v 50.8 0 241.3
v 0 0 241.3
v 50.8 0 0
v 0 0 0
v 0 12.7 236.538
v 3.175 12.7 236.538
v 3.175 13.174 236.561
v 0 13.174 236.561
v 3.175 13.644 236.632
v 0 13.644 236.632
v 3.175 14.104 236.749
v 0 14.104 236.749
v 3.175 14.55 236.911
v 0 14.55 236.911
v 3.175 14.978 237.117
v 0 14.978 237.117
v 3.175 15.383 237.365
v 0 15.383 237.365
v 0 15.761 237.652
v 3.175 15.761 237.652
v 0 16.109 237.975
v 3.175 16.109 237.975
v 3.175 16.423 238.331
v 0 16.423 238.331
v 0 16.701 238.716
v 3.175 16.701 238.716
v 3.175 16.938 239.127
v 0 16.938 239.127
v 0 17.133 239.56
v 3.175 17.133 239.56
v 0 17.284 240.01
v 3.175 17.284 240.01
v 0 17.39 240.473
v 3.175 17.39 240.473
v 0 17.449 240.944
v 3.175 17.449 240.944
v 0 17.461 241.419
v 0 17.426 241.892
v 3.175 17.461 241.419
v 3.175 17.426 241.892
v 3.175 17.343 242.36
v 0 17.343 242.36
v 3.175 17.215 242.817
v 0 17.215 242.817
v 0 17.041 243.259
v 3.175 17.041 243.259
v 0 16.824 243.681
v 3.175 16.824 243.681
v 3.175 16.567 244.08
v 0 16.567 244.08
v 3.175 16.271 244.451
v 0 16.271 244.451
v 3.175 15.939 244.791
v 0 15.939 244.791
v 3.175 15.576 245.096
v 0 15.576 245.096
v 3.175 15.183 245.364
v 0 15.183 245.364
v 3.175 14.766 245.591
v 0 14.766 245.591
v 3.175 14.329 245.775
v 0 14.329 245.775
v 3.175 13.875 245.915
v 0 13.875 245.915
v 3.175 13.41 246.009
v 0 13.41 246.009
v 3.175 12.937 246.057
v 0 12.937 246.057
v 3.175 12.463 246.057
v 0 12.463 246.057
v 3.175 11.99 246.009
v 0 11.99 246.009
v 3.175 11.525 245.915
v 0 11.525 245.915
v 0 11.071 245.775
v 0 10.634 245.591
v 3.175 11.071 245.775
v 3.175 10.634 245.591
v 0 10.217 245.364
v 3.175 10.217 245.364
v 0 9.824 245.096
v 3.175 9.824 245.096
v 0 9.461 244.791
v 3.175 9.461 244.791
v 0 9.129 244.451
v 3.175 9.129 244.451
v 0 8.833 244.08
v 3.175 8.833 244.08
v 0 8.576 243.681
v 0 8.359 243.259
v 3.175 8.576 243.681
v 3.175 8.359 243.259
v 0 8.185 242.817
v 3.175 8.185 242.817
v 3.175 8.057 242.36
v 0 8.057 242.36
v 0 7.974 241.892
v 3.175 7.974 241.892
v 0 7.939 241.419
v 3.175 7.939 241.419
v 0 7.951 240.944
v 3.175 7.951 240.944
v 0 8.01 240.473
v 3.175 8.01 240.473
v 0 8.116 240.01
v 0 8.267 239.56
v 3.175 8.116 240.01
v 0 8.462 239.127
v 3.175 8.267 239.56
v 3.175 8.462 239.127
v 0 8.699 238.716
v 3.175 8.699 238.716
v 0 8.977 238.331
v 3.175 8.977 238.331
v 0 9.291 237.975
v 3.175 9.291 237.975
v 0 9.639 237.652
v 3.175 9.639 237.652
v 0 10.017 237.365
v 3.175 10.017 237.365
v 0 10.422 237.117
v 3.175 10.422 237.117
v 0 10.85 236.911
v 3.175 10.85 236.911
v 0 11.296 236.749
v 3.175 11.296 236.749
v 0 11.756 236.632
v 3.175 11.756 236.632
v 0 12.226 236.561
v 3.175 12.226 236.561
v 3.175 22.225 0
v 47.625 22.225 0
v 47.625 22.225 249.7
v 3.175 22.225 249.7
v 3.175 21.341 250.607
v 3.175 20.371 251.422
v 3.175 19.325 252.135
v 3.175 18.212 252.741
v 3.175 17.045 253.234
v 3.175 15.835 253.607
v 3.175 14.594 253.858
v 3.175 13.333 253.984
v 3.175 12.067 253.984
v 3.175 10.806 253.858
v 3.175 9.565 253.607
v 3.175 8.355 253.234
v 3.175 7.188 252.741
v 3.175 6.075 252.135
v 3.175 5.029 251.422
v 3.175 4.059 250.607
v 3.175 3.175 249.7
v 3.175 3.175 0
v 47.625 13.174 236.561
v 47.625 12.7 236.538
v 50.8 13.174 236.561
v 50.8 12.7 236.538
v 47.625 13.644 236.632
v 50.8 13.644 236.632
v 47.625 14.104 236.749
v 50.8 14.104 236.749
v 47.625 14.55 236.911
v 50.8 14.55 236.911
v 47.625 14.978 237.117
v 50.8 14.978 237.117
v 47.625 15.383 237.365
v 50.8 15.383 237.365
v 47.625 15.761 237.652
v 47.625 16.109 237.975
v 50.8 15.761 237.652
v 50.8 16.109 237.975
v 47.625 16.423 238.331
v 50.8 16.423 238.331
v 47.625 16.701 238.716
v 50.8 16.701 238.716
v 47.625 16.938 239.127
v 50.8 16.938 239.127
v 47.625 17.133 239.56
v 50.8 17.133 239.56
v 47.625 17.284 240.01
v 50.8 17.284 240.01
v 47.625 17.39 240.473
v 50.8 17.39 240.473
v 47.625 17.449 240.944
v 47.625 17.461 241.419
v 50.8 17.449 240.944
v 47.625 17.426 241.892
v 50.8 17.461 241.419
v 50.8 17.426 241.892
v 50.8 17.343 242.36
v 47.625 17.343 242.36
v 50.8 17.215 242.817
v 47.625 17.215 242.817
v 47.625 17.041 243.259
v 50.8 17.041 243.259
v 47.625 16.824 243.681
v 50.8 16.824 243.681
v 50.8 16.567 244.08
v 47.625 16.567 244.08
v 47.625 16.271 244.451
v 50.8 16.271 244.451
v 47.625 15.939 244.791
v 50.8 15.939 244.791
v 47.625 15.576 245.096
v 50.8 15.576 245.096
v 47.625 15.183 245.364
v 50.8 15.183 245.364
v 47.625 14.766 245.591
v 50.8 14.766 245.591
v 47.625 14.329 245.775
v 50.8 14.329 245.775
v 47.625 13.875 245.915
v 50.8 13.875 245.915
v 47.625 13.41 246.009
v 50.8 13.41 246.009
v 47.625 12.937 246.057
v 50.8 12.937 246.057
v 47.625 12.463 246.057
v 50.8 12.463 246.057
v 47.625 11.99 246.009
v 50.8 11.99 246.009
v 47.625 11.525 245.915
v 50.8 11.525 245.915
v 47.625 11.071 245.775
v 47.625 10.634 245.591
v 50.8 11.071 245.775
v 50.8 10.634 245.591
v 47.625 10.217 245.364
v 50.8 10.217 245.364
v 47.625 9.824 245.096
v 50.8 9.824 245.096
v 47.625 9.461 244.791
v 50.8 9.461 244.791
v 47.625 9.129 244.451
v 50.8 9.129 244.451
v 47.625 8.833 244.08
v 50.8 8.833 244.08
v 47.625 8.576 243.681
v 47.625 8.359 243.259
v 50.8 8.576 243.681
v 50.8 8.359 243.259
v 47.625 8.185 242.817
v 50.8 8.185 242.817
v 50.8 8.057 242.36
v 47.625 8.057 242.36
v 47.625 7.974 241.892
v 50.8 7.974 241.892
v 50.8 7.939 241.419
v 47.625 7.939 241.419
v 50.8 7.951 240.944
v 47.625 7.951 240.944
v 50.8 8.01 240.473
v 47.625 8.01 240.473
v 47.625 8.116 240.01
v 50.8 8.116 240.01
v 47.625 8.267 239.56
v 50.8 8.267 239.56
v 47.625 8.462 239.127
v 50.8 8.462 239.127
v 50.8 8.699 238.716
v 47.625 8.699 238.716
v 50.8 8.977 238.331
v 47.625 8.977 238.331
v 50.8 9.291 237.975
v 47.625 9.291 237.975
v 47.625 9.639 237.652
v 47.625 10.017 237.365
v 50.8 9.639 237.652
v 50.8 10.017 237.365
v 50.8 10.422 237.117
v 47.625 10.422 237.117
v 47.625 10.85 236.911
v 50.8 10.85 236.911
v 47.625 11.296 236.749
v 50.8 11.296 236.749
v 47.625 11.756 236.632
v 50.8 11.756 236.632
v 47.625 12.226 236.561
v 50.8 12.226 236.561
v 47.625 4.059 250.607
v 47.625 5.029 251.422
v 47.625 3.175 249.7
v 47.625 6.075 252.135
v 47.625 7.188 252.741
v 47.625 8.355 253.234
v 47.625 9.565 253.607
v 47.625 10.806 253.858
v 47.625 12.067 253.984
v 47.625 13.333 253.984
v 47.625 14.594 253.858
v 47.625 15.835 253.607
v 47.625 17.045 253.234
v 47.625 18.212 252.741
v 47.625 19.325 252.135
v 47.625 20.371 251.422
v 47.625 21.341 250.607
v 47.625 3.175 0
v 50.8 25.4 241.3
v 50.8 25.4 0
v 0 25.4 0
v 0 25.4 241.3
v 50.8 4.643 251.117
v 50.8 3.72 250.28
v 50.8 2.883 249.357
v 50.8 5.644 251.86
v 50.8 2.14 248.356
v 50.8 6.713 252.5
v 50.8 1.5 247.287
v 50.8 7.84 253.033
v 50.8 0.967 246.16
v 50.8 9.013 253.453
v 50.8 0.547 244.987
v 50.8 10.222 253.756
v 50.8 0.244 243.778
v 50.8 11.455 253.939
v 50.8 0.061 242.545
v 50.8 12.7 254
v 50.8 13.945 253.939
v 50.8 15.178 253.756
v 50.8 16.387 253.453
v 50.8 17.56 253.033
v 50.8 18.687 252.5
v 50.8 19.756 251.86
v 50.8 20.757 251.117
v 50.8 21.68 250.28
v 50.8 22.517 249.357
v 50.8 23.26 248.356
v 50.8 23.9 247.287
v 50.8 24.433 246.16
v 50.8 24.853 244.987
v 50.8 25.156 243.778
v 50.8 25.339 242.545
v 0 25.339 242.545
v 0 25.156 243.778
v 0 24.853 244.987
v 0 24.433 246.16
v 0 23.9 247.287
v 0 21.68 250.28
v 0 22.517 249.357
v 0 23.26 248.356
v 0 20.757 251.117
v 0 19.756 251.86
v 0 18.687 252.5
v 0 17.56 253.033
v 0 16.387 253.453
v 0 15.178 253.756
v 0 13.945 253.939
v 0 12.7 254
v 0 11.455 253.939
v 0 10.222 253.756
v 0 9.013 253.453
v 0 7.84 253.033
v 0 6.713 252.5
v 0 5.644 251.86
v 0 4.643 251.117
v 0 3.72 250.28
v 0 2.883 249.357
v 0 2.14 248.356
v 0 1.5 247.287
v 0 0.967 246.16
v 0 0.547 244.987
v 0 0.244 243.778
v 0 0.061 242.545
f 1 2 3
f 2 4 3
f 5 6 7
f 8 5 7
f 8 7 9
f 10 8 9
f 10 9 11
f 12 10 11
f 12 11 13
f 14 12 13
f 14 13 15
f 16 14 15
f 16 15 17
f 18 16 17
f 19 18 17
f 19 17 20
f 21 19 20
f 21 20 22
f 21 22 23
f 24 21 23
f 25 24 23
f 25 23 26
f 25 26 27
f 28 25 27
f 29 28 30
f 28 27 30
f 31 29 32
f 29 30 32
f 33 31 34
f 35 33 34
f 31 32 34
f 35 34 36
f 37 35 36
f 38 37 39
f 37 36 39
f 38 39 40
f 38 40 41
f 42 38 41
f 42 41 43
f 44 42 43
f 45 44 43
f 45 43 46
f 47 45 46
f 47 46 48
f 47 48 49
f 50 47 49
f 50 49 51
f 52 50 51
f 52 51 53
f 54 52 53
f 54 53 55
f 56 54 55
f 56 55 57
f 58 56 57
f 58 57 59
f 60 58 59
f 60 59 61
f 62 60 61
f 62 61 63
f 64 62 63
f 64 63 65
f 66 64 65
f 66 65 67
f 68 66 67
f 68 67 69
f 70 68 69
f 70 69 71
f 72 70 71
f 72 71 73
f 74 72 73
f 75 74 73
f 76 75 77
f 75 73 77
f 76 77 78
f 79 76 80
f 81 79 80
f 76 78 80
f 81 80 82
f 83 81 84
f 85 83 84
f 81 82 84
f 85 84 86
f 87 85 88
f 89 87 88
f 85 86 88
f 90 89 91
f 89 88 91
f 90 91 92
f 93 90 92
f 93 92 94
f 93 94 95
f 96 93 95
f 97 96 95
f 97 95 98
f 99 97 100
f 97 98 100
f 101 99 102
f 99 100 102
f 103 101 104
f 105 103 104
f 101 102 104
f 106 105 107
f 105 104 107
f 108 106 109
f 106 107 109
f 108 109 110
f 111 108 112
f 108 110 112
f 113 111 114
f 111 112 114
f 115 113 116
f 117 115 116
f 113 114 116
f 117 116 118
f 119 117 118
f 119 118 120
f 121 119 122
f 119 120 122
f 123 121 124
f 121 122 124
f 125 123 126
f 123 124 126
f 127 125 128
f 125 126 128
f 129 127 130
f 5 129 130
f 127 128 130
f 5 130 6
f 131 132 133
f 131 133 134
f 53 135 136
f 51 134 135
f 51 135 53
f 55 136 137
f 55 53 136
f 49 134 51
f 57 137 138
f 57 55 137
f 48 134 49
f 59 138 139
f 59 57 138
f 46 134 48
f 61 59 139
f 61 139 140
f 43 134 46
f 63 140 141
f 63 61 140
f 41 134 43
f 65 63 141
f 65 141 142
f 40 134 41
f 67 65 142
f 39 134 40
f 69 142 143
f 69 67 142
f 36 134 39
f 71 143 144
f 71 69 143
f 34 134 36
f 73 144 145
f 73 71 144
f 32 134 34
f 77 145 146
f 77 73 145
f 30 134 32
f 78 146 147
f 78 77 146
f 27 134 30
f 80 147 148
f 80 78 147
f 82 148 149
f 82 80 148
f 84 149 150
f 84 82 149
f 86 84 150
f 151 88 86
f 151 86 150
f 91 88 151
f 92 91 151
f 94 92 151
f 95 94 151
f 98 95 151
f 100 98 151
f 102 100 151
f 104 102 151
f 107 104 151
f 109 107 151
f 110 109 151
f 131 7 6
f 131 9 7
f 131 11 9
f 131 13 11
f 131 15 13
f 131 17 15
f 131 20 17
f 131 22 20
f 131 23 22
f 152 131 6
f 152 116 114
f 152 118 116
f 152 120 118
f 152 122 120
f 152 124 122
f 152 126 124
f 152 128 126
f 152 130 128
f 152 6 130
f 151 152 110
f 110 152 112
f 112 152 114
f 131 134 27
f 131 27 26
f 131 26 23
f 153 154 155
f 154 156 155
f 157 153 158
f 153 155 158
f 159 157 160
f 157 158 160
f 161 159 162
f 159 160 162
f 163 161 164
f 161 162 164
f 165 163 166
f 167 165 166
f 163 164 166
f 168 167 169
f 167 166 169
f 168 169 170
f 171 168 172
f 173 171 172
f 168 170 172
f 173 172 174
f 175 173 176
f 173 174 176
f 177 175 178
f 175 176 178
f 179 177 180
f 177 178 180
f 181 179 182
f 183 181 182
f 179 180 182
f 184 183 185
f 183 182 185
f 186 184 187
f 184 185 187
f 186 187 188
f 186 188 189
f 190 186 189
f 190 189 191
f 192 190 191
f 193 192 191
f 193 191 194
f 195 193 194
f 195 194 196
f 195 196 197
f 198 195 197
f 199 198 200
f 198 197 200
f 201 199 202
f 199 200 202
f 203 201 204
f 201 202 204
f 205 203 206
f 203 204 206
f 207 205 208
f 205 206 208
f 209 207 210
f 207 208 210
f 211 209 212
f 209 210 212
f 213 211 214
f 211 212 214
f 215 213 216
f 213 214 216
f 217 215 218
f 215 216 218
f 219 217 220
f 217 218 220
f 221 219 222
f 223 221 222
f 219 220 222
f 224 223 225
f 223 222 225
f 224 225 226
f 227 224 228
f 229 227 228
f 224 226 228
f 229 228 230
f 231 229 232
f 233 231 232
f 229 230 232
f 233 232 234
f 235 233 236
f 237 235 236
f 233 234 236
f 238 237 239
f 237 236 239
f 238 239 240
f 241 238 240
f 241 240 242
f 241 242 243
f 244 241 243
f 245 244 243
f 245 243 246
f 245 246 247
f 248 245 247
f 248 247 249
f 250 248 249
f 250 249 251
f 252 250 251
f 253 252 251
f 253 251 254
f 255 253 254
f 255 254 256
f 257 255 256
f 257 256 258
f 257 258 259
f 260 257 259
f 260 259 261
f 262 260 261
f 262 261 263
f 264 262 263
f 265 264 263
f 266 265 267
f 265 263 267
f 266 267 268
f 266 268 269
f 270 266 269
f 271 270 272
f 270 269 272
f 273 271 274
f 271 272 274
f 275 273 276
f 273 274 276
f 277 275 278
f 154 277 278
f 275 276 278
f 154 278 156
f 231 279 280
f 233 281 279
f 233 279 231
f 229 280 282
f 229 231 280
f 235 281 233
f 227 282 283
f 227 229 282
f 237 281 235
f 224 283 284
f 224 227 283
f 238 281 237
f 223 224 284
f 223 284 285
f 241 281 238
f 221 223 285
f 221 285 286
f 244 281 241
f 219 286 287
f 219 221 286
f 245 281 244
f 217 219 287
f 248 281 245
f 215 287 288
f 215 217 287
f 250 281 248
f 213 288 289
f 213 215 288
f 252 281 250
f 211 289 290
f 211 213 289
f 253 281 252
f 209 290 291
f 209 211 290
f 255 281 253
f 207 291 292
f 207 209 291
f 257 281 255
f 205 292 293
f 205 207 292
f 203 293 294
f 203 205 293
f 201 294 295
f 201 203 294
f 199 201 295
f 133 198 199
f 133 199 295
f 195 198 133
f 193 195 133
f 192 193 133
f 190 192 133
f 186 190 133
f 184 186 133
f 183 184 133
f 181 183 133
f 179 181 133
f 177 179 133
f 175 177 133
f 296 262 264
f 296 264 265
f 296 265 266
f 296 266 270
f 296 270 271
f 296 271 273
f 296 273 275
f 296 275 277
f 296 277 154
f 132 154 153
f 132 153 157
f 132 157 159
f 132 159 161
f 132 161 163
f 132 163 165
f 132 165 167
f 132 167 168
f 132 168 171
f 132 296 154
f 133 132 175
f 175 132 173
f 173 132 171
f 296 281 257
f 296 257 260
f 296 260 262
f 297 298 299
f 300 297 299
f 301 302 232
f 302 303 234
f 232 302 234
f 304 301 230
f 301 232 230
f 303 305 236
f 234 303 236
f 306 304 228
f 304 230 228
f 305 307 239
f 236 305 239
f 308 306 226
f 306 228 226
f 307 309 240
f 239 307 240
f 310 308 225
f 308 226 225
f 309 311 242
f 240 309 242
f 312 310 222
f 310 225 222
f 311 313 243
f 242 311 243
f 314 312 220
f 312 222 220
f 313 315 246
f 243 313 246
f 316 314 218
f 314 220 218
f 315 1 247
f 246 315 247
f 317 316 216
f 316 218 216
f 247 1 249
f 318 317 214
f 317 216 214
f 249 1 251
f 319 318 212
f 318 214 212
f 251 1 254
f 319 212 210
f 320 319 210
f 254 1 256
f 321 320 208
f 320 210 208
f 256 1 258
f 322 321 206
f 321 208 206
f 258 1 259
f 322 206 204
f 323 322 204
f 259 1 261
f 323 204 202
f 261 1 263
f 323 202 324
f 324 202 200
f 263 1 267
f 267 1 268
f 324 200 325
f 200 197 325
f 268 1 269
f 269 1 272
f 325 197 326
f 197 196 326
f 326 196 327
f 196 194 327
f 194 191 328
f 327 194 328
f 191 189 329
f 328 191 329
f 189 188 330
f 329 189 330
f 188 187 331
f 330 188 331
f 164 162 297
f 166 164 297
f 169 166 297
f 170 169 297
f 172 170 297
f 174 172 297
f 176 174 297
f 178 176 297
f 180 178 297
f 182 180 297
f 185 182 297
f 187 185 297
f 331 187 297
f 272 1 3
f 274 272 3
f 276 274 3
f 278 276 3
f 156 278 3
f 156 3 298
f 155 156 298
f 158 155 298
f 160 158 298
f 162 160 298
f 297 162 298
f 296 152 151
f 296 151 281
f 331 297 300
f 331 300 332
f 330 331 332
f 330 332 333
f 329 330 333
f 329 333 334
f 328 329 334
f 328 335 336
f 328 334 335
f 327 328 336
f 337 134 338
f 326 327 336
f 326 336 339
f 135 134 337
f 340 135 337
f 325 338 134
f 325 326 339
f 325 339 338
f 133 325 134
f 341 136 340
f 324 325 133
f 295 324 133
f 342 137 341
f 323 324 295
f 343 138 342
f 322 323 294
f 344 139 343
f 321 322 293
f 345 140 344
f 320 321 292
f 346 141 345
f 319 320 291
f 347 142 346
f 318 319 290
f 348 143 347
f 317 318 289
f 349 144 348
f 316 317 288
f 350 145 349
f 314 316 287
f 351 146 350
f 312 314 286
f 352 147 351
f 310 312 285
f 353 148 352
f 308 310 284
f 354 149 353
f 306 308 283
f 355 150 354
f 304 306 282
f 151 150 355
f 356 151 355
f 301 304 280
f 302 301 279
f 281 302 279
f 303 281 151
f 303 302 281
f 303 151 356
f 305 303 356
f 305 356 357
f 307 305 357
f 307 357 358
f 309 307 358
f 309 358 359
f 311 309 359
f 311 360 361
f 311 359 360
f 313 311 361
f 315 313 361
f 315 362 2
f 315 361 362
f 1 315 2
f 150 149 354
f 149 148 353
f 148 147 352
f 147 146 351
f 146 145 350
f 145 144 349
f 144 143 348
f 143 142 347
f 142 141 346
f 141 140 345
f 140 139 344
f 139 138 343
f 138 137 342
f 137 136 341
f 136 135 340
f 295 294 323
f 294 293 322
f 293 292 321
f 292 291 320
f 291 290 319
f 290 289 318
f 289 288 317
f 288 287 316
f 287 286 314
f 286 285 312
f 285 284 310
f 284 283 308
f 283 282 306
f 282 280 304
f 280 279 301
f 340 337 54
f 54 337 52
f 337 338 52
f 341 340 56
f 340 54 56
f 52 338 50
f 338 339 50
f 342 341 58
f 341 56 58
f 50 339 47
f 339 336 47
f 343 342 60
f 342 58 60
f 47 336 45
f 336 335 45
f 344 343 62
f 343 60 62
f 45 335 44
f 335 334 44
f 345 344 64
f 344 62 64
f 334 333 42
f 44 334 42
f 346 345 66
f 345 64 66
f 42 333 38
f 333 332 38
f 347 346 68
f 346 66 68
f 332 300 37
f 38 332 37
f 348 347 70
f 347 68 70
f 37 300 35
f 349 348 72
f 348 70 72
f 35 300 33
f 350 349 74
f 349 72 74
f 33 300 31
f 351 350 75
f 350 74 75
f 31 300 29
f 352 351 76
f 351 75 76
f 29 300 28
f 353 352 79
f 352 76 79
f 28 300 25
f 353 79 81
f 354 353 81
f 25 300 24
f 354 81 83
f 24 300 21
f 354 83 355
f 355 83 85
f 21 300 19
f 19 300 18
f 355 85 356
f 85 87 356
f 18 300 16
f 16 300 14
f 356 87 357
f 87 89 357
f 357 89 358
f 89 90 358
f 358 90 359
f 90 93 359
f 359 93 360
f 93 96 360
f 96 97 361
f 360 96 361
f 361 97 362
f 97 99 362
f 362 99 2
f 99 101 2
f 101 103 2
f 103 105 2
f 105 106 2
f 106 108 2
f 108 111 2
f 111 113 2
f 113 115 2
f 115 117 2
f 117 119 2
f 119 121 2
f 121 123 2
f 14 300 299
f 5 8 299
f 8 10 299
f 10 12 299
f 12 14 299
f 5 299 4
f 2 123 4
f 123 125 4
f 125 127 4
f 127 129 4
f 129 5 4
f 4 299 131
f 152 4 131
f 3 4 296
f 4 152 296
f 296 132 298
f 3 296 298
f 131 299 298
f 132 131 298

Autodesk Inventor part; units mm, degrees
ref_plane "YZ Plane" through (0, 0, 0) normal (1, 0, 0) x (0, 1, 0)
ref_plane "XZ Plane" through (0, 0, 0) normal (0, 1, 0) x (-1, 0, 0)
ref_plane "XY Plane" through (0, 0, 0) normal (0, 0, 1) x (1, 0, 0)
sketch "Sketch1" plane through (0, 0, 0) normal (0, 0, 1) x (1, 0, 0)
  line L0 (0, 0) -> (50.8, 0)
  line L1 (50.8, 0) -> (50.8, 25.4)
  line L2 (50.8, 25.4) -> (0, 25.4)
  line L3 (0, 25.4) -> (0, 0)
  line L4 (3.175, 3.175) -> (47.625, 3.175)
  line L5 (47.625, 3.175) -> (47.625, 22.225)
  line L6 (47.625, 22.225) -> (3.175, 22.225)
  line L7 (3.175, 22.225) -> (3.175, 3.175)
  dimension "d0" = 25.4
  dimension "d1" = 50.8
  dimension "d2" = 3.175
  dimension "d3" = 3.175
  dimension "d4" = 3.175
  dimension "d5" = 3.175
extrude "Extrusion1" add sketch "Sketch1" along normal blind 254
sketch "Sketch2" plane through (50.8, 0, 0) normal (1, 0, 0) x (0, 0, -1)
  line L0 (-254, 25.4) -> (-254, 0) projected
  line L1 (0, 0) -> (-254, 0) projected
  line L2 (0, 0) -> (0, 25.4) projected
  line L3 (0, 25.4) -> (-254, 25.4) projected
  circle A0 centre (-241.3, 12.7) radius 4.7625
  arc A1 (-241.3, 25.4) -> (-241.3, 0) centre (-241.3, 12.7) ccw
  dimension "d8" = 9.525
  dimension "d9" = 12.7
extrude "Extrusion2" cut sketch "Sketch2" against normal blind 254 contours L3 A1 L0 | A1 L1 L0 | A0
equation "\"d2\" = d5"
equation "\"d3\" = d2"
equation "\"d4\" = d3"
properties part number "apendage arm"
